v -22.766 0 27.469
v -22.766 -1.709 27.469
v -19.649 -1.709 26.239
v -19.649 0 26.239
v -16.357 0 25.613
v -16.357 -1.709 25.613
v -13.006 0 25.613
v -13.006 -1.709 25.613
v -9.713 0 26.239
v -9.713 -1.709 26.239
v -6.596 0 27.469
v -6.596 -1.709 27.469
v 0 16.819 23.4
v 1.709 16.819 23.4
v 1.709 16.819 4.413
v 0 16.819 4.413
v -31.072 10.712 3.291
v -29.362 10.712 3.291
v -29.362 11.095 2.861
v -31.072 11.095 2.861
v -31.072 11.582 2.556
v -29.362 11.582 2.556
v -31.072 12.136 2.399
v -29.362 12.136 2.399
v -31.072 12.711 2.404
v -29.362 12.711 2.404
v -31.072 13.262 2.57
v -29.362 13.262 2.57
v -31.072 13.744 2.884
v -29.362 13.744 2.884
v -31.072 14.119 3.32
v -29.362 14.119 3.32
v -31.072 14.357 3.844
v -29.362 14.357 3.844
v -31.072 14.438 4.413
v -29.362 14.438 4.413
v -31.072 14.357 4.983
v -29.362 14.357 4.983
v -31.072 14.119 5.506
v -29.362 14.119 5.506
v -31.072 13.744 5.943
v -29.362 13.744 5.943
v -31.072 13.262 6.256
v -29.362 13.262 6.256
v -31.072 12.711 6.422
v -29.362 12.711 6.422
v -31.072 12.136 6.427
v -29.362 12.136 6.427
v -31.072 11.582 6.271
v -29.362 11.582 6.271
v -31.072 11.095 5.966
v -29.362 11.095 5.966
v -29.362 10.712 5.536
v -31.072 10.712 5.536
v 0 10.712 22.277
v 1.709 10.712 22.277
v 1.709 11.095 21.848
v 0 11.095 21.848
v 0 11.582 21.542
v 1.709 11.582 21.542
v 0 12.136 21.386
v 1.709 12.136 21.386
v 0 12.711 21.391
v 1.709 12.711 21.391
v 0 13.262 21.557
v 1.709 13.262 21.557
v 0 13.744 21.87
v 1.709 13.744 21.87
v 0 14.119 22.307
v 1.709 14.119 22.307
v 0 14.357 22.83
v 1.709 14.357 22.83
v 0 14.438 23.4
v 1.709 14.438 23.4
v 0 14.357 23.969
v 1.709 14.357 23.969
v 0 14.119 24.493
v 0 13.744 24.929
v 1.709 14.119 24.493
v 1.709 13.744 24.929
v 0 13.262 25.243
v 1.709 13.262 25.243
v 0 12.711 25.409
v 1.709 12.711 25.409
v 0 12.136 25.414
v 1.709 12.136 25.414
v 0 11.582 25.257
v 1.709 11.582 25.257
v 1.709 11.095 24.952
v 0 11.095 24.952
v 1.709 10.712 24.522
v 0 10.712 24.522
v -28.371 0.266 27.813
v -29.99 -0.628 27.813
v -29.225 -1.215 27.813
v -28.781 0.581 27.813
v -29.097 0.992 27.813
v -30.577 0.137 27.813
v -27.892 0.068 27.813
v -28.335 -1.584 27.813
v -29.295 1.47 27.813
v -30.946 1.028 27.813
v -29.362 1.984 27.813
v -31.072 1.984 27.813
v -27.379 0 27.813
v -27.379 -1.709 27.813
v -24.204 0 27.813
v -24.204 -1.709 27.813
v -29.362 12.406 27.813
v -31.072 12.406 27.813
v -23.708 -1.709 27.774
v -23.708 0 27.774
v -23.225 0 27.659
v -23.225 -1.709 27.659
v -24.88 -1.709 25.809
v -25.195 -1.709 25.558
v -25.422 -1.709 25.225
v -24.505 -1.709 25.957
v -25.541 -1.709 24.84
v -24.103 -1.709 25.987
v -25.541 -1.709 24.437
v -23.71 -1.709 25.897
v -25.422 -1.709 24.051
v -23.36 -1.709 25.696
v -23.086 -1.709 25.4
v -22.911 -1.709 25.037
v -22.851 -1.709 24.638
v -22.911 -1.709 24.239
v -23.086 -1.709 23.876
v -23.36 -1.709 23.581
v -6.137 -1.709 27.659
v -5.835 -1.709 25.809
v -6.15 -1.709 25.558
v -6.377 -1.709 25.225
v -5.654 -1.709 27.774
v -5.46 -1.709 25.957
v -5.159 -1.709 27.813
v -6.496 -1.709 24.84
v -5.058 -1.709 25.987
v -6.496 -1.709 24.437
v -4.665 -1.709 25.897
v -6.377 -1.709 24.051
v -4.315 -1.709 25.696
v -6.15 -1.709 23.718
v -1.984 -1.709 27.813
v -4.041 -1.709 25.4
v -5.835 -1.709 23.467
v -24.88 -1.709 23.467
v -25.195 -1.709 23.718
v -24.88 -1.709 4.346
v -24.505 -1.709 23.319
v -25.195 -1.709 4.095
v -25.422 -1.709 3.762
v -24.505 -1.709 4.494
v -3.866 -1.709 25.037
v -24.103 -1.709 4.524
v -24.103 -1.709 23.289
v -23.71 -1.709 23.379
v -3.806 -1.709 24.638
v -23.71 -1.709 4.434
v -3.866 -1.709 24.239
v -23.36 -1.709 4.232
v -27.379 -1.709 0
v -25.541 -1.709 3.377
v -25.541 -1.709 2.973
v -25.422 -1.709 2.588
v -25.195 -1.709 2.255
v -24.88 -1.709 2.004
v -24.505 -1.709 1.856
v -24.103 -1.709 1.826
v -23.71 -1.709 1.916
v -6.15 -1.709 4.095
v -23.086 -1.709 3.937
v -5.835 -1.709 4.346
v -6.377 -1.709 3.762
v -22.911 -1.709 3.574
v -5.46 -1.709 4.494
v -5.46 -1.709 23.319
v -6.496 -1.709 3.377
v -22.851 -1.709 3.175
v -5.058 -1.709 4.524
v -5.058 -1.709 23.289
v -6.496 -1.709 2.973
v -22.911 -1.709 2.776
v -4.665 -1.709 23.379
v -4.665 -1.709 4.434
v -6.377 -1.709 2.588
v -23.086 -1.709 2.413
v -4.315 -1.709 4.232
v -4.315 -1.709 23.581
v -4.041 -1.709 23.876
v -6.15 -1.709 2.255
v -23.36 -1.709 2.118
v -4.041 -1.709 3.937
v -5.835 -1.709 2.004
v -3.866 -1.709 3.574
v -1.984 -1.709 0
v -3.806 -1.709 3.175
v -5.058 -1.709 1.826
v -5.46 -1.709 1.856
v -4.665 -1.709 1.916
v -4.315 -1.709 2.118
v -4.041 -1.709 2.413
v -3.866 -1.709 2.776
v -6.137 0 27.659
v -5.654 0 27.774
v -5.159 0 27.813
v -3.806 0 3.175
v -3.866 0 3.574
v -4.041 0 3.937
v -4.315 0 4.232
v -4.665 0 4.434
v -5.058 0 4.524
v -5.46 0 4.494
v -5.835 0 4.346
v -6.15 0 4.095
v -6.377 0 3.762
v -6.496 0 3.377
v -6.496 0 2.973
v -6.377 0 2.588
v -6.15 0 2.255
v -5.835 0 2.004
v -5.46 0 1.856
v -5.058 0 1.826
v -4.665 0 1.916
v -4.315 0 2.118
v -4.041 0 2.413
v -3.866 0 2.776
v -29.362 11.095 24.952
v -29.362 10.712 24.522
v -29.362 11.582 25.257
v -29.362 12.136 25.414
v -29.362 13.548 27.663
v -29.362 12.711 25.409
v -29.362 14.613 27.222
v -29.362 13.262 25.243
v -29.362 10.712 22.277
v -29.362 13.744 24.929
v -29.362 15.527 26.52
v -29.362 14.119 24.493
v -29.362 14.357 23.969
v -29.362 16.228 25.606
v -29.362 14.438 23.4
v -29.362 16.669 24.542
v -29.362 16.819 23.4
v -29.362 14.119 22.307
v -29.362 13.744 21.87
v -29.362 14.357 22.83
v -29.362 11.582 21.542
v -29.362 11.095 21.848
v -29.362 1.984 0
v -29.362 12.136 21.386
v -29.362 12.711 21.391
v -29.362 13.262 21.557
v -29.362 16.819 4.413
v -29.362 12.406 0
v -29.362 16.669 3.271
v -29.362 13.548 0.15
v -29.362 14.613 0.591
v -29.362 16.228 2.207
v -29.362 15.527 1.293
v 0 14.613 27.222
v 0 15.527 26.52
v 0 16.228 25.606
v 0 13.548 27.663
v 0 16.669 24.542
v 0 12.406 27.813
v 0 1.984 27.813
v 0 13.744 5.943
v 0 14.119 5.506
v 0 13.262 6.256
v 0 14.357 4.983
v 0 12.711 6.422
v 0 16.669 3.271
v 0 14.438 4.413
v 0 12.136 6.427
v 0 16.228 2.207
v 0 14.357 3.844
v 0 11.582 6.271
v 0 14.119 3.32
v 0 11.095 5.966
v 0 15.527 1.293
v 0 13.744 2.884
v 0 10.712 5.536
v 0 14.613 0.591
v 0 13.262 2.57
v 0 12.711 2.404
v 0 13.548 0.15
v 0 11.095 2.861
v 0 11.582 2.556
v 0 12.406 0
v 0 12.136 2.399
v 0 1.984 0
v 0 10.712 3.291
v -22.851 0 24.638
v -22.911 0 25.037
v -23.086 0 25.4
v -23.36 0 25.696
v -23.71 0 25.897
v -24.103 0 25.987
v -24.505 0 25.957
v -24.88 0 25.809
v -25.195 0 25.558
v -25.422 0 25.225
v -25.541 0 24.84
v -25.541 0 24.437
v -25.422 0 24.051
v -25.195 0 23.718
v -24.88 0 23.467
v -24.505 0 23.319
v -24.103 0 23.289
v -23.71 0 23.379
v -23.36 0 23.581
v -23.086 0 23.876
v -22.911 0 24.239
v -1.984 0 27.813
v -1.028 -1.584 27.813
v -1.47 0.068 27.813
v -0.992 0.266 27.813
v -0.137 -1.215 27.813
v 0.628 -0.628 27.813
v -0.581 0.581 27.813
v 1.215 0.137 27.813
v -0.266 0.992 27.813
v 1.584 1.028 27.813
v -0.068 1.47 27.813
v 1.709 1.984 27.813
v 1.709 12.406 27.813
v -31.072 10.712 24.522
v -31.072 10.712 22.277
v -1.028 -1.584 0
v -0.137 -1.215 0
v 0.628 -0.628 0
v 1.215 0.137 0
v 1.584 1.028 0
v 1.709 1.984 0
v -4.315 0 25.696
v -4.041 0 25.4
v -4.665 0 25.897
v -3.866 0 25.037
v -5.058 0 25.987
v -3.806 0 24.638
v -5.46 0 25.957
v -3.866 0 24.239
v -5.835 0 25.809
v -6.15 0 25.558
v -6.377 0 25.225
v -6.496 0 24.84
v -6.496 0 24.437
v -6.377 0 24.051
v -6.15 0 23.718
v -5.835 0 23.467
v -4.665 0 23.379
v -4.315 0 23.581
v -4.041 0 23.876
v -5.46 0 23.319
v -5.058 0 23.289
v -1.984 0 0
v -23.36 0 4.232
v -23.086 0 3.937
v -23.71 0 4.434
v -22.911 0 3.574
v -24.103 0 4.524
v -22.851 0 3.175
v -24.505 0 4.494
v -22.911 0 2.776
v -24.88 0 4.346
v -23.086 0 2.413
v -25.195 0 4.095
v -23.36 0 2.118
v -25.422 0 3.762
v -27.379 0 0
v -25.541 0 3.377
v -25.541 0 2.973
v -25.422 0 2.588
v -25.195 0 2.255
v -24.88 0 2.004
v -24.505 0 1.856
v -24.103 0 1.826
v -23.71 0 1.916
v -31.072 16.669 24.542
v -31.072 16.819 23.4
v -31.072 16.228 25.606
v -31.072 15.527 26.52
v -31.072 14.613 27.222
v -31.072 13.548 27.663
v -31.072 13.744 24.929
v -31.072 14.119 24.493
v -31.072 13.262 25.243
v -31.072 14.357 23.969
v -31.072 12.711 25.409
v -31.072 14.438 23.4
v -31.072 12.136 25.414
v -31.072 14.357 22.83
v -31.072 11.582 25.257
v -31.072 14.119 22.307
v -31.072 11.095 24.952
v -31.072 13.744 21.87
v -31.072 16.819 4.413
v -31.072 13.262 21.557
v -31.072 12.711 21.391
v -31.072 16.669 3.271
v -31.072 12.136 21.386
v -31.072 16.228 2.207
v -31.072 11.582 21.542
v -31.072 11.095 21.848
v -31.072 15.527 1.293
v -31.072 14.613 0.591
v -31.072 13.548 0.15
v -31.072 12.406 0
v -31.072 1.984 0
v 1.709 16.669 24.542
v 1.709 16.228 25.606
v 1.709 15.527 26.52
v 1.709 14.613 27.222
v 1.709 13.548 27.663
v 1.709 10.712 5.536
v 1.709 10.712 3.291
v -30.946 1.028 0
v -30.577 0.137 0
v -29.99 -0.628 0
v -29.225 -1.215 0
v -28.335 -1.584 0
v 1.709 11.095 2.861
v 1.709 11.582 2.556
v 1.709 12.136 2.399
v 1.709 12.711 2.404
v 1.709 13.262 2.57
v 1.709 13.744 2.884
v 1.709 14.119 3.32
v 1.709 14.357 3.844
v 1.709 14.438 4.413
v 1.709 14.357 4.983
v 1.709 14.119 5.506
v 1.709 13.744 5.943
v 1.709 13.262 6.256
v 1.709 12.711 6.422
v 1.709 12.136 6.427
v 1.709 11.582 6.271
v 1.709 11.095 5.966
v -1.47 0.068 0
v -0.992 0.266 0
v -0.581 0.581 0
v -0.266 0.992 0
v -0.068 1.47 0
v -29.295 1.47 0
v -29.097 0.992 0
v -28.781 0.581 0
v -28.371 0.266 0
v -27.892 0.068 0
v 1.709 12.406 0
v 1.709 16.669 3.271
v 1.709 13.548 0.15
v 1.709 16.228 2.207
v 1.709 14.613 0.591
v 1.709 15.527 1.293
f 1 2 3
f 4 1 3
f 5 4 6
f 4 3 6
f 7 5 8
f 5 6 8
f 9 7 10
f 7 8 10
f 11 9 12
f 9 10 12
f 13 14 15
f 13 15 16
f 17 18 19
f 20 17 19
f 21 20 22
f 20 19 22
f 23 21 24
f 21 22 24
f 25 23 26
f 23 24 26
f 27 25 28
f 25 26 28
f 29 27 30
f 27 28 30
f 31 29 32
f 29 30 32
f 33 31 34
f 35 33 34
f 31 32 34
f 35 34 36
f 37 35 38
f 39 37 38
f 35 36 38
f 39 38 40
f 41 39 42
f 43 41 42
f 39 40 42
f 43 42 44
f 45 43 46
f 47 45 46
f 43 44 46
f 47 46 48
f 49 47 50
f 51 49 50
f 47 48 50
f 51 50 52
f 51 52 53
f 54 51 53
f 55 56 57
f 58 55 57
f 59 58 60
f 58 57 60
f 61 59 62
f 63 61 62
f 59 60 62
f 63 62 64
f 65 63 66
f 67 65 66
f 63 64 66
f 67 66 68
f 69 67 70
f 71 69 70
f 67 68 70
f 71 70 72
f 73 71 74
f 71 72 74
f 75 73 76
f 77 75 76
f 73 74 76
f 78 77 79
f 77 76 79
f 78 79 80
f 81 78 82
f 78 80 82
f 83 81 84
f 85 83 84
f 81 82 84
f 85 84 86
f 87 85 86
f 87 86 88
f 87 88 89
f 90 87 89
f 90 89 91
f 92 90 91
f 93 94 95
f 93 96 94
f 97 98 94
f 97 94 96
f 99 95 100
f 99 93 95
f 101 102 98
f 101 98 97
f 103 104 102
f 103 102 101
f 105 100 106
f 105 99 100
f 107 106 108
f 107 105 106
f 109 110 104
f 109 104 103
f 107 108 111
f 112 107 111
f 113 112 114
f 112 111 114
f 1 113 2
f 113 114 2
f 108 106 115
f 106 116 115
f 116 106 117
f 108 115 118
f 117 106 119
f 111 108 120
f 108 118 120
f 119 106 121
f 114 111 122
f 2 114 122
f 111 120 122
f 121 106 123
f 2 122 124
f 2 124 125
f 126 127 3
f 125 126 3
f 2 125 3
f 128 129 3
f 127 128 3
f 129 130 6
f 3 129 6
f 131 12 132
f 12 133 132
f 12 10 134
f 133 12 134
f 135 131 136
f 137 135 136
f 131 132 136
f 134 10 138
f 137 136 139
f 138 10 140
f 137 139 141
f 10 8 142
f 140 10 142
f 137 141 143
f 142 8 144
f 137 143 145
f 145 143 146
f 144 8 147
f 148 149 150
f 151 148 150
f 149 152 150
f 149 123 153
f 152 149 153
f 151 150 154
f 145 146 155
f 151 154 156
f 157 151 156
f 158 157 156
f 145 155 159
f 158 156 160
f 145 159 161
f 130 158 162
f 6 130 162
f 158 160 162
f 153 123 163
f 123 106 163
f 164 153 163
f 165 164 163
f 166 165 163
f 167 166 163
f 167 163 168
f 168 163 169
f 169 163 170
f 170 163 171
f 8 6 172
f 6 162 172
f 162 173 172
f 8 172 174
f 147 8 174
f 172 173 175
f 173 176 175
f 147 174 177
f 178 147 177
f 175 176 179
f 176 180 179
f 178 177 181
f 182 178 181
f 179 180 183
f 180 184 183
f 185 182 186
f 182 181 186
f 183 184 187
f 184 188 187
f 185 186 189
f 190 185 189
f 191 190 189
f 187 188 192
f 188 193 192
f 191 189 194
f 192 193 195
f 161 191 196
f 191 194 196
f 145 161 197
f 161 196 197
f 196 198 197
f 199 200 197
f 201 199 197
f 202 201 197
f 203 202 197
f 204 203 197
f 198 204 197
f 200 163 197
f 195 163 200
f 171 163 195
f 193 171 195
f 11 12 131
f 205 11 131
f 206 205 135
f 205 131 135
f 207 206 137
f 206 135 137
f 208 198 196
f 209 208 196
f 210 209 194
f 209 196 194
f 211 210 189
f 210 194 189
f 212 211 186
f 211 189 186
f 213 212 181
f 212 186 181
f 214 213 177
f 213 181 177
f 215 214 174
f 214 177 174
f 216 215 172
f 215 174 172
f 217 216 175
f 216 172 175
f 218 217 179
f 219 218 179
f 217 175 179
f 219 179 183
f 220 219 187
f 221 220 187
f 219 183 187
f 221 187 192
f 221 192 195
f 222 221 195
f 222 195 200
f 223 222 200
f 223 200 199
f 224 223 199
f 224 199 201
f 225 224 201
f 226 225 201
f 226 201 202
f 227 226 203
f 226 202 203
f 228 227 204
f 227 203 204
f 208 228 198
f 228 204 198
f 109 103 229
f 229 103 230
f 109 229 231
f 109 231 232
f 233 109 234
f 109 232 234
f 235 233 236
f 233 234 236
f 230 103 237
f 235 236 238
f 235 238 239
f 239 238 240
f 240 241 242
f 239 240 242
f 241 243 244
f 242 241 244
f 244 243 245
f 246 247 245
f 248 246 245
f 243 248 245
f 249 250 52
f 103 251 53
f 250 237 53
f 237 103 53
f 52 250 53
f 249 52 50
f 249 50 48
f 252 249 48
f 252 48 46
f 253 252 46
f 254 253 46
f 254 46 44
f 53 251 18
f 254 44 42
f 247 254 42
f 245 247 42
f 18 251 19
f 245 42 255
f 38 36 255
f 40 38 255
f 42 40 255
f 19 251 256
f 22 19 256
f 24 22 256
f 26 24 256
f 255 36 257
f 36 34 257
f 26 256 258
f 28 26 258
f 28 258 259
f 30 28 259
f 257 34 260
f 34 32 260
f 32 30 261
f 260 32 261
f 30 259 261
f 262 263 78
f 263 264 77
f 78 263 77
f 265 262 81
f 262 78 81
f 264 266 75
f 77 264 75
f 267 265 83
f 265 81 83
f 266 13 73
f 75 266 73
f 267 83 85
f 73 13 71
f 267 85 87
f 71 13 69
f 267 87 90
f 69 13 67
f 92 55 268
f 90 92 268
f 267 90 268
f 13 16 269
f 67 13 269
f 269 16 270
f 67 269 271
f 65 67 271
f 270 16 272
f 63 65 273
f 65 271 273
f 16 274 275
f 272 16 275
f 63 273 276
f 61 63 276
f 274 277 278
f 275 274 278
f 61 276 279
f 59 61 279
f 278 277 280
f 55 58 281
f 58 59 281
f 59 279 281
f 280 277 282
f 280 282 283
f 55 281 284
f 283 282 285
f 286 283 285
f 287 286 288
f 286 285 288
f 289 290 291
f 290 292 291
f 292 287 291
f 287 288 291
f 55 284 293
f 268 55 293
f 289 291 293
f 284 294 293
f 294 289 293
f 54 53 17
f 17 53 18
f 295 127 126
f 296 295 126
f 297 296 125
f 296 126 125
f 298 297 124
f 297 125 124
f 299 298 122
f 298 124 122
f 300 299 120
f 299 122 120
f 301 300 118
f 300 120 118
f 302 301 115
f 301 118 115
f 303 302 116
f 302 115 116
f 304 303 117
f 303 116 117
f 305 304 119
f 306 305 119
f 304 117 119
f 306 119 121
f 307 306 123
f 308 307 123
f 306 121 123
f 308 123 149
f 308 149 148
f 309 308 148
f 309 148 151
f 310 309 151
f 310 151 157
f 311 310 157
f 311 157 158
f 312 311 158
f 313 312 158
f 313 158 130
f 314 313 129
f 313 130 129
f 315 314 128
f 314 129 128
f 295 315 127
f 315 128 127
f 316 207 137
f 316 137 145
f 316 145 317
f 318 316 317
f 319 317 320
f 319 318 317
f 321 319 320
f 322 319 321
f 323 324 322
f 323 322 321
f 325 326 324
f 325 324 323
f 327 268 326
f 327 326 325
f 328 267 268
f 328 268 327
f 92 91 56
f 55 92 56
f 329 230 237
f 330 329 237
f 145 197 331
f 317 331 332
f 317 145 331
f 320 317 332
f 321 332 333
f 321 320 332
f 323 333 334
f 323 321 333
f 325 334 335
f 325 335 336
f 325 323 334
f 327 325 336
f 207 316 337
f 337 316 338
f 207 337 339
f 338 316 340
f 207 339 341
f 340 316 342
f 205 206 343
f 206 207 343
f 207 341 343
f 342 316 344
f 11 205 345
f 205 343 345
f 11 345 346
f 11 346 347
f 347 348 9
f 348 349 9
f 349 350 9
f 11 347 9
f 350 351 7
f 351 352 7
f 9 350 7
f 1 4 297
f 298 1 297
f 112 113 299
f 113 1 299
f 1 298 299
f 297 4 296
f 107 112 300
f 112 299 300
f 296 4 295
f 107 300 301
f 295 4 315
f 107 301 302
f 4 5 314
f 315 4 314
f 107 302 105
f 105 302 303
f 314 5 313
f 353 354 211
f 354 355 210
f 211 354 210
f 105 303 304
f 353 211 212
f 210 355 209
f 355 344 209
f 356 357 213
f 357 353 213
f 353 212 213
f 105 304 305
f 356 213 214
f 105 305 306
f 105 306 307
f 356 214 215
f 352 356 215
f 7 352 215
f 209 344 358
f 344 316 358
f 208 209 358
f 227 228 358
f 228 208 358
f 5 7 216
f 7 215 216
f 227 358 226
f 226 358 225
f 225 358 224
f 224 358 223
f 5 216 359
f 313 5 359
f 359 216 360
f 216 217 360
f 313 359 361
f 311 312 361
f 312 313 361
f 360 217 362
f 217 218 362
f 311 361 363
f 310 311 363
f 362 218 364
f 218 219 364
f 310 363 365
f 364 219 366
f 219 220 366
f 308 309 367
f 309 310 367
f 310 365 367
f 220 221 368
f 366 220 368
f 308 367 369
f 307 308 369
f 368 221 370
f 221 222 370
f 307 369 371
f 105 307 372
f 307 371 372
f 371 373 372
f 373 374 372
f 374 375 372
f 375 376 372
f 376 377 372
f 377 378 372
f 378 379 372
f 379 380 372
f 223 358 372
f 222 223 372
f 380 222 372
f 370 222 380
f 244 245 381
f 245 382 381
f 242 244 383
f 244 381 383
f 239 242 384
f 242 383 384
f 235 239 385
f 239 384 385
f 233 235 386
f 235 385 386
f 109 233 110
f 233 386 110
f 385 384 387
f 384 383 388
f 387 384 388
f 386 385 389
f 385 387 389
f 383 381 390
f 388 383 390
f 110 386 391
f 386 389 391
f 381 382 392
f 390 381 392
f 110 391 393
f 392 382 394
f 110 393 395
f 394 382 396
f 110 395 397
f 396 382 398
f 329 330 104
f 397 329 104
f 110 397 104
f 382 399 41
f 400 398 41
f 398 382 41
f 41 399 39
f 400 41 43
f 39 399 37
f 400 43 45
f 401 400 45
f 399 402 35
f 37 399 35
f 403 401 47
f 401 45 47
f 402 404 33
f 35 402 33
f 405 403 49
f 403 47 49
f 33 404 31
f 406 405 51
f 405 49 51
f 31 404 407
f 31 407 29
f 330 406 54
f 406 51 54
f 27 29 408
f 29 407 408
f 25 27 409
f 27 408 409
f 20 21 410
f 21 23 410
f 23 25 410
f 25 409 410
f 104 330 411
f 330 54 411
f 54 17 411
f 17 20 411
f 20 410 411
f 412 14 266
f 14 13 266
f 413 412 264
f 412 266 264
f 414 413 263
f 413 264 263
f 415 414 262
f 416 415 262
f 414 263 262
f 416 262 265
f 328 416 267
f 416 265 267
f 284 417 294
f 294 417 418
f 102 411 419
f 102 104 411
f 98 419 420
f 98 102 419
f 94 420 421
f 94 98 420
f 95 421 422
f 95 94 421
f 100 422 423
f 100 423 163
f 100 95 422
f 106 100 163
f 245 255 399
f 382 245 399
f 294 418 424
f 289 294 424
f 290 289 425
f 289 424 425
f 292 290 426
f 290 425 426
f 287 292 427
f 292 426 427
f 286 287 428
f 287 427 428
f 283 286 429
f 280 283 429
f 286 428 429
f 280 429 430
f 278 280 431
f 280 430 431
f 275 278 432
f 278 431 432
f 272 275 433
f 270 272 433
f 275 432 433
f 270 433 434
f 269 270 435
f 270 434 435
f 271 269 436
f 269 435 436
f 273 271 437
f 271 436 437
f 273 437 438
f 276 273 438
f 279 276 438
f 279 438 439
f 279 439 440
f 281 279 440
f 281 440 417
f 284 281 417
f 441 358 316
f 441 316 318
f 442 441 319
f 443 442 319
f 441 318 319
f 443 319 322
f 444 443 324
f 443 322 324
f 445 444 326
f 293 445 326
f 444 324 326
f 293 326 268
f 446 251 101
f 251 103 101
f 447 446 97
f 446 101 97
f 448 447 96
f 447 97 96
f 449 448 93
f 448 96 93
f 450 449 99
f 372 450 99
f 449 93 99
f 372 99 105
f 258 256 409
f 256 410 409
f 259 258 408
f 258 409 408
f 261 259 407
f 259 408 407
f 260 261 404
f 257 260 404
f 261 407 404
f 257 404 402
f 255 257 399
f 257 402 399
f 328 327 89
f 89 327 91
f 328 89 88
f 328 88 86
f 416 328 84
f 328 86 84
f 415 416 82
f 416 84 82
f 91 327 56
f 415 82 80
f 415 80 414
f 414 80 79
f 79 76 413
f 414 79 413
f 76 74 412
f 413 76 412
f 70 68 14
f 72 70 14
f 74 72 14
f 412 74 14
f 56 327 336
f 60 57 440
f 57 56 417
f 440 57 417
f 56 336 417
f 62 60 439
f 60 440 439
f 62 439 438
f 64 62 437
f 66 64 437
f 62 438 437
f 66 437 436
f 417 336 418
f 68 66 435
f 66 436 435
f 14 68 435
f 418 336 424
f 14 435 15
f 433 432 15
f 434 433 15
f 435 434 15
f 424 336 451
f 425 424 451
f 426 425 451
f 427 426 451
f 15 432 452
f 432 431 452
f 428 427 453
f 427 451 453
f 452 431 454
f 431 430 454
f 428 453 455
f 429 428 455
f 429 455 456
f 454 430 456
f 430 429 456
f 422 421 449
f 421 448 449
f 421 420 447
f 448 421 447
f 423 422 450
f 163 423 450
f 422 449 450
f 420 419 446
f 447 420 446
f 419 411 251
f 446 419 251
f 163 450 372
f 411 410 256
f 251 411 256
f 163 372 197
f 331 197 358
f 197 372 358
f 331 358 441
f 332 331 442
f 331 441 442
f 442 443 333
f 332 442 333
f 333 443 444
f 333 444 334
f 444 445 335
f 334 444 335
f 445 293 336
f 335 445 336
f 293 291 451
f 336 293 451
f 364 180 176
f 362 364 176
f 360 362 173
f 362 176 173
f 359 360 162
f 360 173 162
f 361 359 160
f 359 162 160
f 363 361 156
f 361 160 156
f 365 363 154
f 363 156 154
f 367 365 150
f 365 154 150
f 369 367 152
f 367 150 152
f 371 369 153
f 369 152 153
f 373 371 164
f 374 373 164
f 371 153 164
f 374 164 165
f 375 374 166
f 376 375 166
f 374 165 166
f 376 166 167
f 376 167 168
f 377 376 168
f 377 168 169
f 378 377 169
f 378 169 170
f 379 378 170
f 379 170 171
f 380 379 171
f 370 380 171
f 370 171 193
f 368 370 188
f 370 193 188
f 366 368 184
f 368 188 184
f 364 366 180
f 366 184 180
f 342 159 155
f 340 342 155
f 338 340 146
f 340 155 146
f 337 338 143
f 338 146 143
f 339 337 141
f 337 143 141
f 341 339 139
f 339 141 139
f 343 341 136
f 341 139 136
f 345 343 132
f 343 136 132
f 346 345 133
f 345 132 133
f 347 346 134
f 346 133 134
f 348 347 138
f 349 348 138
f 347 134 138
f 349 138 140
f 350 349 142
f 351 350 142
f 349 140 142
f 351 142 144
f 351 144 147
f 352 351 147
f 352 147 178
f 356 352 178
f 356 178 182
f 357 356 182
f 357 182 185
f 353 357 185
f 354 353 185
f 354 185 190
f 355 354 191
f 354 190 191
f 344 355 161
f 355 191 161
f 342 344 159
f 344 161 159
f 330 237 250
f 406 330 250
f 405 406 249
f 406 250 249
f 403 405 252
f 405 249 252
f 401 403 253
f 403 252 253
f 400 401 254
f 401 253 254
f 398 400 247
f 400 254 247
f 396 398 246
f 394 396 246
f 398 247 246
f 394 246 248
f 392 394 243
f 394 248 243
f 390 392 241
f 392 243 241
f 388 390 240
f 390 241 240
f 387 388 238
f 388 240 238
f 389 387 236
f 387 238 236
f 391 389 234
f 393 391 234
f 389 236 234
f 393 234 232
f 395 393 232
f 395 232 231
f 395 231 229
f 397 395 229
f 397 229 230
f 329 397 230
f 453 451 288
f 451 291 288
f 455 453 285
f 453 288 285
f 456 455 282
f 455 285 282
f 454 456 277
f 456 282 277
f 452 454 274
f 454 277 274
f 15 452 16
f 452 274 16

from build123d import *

# Parameters (mm, degrees)
F1_DEPTH = 27.8131016
F2_R     = 3.69316
F3_R     = 1.98374
F5_DEPTH = 32.78124
F6_R     = 1.35255
F7_DEPTH = 1.70942
F8_R     = 4.41325


with BuildPart() as f1:
    # F0 (on Top) → F1 (new body)
    with BuildSketch(Plane.XY):
        Polygon((0, 16.8191942), (0, 0), (-29.3624, 0), (-29.3624, 16.8191942), (-31.07182, 16.8191942), (-31.07182, -1.70942), (1.70942, -1.70942), (1.70942, 16.8191942), align=None)
    extrude(amount=F1_DEPTH)

    # F2
    f2_edges = [f1.edges().sort_by_distance(p)[0] for p in [
        (1.70942, -1.70942, 13.906551),
        (-31.07182, -1.70942, 13.906551),
    ]]
    fillet(f2_edges, radius=F2_R)

    # F3
    f3_edges = [f1.edges().sort_by_distance(p)[0] for p in [
        (0, 0, 13.906551),
        (-29.3624, 0, 13.906551),
    ]]
    fillet(f3_edges, radius=F3_R)

    # F4 (on face) → F5 (cut, through all)
    with BuildSketch(Plane.YZ.offset(1.70942)):
        with BuildLine():
            Line((10.7121942, 24.5224534606), (10.7121942, 22.2772497394))
            ThreePointArc((10.7121942, 22.2772497394), (14.4379442, 23.3998516), (10.7121942, 24.5224534606))
        make_face()
        with BuildLine():
            Line((10.7121942, 5.5358518606), (10.7121942, 3.2906481394))
            ThreePointArc((10.7121942, 3.2906481394), (14.4379442, 4.41325), (10.7121942, 5.5358518606))
        make_face()
    extrude(amount=-F5_DEPTH, mode=Mode.SUBTRACT)

    # F6 (on face) → F7 (cut, through all)
    with BuildSketch(Plane.XZ.offset(1.70942)):
        with BuildLine():
            ThreePointArc((-6.5960560047, 27.4691345745), (-5.8976903725, 27.7259126932), (-5.15874, 27.8131016))
            Line((-5.15874, 27.8131016), (-24.20366, 27.8131016))
            ThreePointArc((-24.20366, 27.8131016), (-23.4647096275, 27.7259126932), (-22.7663439953, 27.4691345745))
            ThreePointArc((-22.7663439953, 27.4691345745), (-14.6812, 25.5342622696), (-6.5960560047, 27.4691345745))
        make_face()
        with Locations((-24.20366, 24.6381016)):
            Circle(F6_R)
        with Locations((-5.15874, 24.6381016)):
            Circle(F6_R)
        with Locations((-24.20366, 3.175)):
            Circle(F6_R)
        with Locations((-5.15874, 3.175)):
            Circle(F6_R)
    extrude(amount=-F7_DEPTH, mode=Mode.SUBTRACT)

    # F8
    f8_edges = [f1.edges().sort_by_distance(p)[0] for p in [
        (0.85471, 16.819194, 27.813102),
        (-30.21711, 16.819194, 27.813102),
        (0.85471, 16.819194, 0),
        (-30.21711, 16.819194, 0),
    ]]
    fillet(f8_edges, radius=F8_R)


solid = f1.part
